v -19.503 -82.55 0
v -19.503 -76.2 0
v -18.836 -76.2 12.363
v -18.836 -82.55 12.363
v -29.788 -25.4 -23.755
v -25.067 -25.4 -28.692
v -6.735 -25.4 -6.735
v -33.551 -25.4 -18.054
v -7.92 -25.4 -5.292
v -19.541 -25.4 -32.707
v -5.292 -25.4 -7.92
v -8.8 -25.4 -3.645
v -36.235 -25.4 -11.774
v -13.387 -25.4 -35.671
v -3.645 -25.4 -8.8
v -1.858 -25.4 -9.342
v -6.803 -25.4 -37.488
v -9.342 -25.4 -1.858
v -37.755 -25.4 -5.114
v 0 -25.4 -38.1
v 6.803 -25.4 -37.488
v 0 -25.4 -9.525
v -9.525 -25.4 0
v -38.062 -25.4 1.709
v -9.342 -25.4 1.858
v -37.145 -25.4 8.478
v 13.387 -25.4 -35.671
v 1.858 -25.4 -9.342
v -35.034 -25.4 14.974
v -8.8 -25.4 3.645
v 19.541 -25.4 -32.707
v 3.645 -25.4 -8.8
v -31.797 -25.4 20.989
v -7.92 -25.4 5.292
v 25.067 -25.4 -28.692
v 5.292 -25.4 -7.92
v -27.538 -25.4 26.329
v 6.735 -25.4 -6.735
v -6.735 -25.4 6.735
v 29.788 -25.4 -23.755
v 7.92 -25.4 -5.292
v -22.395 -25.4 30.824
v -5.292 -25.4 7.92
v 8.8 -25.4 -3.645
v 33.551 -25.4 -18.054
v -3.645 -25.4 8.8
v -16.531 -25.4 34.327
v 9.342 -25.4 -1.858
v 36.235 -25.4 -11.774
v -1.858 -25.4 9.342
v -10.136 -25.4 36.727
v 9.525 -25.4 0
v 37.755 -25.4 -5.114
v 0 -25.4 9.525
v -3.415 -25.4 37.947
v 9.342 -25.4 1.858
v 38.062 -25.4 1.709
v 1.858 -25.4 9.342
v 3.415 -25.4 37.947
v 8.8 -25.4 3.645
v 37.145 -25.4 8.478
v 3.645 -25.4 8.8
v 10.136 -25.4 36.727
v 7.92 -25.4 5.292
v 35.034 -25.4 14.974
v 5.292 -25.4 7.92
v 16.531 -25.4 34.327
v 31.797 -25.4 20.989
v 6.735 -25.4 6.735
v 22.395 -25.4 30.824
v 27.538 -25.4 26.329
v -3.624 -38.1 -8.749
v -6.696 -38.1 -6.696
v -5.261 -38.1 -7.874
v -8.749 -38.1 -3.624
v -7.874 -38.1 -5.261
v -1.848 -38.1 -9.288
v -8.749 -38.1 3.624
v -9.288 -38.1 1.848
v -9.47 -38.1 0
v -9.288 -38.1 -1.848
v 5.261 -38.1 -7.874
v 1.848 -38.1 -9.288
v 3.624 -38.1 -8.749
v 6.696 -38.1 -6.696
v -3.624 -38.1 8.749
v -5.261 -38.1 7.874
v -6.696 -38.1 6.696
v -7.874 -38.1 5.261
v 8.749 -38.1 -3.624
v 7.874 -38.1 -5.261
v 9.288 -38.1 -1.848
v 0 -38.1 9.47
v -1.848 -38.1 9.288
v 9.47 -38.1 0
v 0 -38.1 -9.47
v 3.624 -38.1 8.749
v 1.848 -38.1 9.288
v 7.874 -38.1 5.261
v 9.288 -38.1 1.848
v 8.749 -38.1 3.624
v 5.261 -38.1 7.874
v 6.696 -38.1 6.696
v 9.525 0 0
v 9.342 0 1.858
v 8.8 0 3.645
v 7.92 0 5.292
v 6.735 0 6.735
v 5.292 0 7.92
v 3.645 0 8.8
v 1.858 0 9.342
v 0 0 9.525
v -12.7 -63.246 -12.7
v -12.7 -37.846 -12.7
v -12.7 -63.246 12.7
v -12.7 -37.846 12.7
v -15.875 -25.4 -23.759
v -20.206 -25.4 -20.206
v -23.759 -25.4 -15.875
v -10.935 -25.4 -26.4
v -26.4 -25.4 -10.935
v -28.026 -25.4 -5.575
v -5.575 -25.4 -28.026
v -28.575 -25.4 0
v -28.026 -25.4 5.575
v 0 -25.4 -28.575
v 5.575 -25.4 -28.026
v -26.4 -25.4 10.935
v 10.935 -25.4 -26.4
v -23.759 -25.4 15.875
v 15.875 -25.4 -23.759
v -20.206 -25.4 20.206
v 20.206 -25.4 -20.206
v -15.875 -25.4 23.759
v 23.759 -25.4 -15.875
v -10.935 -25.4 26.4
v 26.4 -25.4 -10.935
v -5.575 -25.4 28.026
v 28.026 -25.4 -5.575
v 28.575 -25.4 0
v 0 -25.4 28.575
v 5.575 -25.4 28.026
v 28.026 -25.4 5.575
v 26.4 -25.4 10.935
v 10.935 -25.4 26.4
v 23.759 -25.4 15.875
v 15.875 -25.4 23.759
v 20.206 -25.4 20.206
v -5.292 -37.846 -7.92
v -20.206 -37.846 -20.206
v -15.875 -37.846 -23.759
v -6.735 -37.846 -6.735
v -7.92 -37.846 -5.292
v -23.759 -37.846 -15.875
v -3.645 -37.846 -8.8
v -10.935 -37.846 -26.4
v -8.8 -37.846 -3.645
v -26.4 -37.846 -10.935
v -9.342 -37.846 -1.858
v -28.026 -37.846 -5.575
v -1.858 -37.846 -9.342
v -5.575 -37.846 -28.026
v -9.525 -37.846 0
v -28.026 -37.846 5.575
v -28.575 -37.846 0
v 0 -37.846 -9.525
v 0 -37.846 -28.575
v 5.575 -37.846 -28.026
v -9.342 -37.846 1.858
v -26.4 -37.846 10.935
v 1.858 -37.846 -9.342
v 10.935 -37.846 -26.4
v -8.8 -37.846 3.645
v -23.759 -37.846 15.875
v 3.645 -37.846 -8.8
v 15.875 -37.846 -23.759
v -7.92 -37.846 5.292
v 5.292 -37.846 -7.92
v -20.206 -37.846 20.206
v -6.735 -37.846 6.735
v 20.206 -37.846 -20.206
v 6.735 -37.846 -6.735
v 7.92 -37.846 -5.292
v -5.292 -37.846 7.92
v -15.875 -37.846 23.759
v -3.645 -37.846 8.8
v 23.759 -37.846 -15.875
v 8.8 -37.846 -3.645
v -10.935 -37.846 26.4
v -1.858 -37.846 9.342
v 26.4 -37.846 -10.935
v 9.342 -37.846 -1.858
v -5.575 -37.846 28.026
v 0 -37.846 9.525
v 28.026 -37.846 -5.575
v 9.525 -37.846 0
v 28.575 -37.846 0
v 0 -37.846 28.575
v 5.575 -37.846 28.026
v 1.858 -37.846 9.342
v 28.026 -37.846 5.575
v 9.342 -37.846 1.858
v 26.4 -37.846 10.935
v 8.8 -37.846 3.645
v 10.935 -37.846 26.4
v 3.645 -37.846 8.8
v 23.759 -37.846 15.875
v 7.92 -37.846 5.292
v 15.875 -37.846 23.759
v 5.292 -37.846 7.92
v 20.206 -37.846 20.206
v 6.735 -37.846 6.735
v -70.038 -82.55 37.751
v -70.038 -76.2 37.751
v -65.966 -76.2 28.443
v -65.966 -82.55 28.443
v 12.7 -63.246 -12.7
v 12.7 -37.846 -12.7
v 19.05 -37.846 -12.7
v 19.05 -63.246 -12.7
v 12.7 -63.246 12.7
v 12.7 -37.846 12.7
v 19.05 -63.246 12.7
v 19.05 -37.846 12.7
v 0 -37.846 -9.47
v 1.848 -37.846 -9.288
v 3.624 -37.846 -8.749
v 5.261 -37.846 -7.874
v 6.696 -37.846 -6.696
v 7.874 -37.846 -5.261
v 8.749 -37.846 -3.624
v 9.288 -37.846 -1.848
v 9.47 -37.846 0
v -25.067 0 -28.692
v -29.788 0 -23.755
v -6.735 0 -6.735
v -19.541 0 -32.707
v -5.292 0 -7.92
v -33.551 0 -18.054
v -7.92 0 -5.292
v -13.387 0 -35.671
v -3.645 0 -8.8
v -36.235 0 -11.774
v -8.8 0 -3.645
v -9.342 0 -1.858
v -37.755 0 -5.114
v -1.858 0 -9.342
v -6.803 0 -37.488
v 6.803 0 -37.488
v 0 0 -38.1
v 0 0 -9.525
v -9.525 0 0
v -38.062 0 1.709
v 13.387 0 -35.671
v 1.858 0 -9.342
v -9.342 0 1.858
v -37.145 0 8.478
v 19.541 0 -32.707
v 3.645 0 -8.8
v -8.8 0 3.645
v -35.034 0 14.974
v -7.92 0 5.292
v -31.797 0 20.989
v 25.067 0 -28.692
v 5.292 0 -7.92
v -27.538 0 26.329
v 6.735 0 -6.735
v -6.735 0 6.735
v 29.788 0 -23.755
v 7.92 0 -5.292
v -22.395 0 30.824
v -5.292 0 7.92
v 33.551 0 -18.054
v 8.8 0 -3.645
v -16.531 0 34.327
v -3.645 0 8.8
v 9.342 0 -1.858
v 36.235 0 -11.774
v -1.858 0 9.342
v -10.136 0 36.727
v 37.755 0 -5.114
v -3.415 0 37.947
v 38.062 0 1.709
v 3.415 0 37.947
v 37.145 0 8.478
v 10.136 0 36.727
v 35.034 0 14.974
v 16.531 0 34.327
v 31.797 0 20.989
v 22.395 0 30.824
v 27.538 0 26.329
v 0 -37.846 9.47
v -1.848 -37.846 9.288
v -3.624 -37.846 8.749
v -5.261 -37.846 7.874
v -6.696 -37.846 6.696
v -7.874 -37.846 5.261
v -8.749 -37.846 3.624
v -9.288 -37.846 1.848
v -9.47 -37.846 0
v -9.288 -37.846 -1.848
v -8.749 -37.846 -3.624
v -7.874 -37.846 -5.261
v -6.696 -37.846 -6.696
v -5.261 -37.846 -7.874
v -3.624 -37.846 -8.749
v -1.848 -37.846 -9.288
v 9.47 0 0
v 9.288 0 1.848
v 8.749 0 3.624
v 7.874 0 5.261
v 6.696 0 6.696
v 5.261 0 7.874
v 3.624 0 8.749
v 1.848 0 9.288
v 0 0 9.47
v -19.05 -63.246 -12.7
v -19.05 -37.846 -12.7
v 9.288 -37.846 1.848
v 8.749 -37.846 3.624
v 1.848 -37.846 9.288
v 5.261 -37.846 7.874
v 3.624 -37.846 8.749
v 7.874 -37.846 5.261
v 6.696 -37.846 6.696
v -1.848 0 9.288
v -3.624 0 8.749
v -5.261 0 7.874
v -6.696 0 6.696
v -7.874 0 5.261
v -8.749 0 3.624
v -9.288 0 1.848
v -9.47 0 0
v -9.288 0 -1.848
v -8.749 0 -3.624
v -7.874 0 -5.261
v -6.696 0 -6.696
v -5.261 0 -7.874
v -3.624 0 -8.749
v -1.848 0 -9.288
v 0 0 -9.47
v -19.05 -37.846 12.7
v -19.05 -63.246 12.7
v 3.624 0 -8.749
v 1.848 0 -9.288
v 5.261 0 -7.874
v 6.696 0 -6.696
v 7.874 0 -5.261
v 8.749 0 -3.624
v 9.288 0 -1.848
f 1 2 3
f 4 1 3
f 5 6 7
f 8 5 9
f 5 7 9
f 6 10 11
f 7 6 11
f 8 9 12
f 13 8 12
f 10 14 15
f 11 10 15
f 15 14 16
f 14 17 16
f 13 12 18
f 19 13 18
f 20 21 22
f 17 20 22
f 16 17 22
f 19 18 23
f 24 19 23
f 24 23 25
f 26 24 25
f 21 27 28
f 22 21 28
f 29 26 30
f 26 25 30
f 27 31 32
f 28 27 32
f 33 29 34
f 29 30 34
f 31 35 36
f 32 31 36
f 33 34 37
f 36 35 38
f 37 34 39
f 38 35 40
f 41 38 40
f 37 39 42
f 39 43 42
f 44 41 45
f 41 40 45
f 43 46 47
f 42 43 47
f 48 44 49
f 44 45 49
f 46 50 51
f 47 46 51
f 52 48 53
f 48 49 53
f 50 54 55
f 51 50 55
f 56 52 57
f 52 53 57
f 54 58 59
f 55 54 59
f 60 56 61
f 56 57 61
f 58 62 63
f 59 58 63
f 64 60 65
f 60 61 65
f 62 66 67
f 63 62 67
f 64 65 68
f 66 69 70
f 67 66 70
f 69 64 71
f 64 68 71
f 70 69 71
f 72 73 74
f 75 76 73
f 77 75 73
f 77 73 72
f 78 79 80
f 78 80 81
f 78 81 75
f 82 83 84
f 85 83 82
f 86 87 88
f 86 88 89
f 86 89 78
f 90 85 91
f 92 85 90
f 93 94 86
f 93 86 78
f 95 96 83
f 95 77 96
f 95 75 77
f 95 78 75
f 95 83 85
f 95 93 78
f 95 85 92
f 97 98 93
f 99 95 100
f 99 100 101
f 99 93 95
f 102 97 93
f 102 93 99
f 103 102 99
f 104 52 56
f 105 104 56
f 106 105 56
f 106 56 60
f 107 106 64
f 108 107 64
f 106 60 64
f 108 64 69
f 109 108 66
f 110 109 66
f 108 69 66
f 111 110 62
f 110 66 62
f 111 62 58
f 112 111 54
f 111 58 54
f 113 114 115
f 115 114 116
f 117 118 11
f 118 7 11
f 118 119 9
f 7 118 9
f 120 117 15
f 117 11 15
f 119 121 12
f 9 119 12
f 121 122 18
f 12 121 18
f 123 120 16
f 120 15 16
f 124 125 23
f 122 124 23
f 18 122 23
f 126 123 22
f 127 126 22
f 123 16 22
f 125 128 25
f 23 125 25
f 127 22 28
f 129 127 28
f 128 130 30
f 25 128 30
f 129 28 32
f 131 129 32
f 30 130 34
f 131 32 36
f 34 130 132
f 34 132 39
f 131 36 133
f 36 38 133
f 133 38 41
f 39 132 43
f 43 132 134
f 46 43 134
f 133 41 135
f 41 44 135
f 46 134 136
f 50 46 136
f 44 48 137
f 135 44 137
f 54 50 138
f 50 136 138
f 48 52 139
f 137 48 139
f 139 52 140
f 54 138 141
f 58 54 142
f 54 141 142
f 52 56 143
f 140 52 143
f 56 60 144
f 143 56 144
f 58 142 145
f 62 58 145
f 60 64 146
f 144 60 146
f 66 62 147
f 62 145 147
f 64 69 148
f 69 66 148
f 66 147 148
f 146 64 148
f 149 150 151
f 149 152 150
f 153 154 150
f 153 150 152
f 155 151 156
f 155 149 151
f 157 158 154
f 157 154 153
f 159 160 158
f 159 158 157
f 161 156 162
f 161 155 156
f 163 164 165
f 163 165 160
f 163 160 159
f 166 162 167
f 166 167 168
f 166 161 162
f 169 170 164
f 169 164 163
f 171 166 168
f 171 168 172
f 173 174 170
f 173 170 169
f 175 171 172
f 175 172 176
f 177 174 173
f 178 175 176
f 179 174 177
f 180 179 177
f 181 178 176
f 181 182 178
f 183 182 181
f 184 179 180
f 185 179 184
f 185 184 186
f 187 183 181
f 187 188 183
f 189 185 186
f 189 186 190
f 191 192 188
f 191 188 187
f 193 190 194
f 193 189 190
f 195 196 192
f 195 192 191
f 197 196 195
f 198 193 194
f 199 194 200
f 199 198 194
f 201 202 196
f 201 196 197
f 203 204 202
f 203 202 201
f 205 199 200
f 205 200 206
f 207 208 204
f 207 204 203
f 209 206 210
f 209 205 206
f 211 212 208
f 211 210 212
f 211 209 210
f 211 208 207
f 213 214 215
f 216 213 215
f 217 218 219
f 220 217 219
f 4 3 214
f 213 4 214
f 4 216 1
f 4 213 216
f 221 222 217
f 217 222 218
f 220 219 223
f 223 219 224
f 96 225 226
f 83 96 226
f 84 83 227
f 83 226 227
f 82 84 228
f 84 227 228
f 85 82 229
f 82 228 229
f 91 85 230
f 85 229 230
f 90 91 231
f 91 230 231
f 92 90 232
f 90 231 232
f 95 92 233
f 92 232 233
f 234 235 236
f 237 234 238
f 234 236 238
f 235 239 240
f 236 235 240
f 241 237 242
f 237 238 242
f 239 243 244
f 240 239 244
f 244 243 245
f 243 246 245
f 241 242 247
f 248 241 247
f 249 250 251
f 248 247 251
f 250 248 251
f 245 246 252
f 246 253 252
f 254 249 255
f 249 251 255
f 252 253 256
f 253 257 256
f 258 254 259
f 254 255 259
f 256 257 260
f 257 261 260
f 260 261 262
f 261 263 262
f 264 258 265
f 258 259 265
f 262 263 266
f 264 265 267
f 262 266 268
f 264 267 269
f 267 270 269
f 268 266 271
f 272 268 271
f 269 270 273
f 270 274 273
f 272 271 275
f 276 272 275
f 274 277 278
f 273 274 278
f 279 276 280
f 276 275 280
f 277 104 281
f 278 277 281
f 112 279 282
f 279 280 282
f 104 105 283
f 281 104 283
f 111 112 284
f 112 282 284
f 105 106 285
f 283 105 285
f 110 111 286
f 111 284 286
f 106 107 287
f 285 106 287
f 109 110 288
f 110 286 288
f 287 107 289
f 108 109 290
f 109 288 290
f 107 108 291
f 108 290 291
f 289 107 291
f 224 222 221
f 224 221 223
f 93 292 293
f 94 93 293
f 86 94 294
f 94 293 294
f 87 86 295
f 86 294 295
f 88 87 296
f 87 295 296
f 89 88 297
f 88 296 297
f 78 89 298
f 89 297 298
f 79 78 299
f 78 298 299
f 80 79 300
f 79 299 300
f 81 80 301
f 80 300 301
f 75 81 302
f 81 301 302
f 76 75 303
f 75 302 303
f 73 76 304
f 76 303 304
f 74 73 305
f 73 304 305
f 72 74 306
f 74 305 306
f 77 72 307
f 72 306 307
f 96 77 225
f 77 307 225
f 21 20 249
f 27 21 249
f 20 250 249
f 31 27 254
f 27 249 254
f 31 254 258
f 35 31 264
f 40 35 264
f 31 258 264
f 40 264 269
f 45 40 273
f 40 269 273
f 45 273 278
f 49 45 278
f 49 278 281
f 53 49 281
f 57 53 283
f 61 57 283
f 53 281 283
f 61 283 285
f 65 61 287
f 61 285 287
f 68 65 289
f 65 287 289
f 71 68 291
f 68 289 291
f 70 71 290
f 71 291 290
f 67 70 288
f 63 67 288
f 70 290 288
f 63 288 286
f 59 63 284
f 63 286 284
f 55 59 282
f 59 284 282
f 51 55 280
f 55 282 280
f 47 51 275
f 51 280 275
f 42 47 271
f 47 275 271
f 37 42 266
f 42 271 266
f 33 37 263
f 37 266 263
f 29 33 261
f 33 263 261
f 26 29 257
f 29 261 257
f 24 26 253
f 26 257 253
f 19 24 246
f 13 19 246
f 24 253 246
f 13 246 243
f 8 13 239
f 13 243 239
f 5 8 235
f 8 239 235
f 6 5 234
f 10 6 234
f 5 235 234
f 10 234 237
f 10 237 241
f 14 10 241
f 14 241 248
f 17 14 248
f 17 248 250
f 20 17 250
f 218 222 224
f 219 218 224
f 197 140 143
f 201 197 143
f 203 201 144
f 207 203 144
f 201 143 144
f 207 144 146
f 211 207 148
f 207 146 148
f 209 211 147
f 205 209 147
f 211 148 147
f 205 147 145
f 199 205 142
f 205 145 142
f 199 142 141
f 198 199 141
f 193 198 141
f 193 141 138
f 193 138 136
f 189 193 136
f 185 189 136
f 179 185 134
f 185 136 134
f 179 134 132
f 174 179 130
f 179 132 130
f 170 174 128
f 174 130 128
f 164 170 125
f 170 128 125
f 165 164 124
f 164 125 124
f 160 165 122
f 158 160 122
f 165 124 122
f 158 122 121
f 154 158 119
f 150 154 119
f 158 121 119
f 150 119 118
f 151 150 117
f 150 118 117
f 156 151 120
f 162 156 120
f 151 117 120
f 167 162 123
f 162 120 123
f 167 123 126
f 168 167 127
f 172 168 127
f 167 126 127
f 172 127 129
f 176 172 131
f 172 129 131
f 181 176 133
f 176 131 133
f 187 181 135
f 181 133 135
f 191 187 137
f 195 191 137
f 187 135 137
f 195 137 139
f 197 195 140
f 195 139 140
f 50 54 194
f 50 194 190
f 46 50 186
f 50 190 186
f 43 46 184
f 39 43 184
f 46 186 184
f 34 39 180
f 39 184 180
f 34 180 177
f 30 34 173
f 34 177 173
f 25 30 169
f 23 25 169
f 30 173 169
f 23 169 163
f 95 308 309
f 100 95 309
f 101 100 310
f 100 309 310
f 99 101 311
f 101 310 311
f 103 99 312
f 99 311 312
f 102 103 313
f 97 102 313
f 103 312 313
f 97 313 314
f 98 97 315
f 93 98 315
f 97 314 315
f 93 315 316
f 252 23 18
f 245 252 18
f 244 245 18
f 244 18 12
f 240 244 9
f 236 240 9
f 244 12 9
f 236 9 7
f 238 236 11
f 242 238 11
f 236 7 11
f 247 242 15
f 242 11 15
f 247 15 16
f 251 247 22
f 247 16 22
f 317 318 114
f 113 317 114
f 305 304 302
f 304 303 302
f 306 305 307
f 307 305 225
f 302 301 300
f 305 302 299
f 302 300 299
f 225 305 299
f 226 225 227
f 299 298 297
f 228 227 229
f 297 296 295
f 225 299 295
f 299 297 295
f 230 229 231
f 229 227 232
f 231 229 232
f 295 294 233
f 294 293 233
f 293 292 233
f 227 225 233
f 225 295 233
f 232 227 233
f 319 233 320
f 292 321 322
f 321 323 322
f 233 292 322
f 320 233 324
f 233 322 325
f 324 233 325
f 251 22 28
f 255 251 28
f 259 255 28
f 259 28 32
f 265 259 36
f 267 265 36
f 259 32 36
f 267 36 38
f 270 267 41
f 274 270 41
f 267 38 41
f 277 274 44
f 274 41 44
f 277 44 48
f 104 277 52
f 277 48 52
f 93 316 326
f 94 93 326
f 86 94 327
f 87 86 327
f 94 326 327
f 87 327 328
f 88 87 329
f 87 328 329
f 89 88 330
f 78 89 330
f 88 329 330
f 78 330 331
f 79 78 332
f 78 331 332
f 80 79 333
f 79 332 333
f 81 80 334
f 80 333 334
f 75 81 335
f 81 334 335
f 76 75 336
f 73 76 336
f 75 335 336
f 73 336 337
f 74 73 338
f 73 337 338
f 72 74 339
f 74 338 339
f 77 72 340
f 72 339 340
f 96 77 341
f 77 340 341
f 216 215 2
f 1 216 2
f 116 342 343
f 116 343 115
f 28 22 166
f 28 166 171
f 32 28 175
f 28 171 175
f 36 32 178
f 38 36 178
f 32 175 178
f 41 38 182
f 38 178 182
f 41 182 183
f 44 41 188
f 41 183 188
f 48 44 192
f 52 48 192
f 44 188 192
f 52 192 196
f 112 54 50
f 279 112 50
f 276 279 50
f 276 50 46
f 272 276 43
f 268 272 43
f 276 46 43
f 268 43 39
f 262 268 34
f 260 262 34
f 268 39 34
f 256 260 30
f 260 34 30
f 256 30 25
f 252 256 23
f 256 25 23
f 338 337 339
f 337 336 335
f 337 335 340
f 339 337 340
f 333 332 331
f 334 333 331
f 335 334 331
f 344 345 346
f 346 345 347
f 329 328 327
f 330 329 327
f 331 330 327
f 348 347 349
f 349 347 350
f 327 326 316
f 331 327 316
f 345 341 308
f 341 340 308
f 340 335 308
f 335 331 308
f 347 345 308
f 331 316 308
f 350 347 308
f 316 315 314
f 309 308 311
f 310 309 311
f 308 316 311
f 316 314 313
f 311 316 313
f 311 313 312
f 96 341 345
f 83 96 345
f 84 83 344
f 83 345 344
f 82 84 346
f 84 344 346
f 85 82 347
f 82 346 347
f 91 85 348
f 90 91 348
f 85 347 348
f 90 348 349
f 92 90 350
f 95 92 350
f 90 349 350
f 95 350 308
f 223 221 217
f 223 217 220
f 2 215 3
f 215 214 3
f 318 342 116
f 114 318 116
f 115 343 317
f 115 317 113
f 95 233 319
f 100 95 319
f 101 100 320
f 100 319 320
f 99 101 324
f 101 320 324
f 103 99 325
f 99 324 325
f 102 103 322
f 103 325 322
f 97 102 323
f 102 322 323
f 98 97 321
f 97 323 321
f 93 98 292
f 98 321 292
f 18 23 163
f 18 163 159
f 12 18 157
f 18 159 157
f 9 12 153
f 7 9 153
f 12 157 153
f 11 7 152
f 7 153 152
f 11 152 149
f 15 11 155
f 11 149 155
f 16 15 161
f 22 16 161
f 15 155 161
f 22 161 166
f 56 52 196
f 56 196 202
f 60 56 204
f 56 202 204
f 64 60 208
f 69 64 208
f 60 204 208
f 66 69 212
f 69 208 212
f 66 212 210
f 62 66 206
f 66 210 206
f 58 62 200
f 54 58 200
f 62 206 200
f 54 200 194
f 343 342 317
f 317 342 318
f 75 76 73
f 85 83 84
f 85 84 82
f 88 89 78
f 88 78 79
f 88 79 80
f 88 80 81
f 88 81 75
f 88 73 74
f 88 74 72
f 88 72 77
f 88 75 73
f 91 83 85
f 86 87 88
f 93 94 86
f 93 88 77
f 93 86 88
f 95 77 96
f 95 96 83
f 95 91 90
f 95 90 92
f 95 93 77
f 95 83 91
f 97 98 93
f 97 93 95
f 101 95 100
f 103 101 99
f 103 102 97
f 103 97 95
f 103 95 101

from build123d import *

# Parameters (mm, degrees)
F4_DEPTH  = 38.1
F3_R      = 28.575
F3_R_2    = 9.4701166516
F5_DEPTH  = 12.446
F7_DEPTH  = 118.13693
F8_DEPTH  = 38.1
F6_W      = 6.35
F6_H      = 12.7
F9_DEPTH  = 25.4
F11_START = 76.2
F11_DEPTH = 6.35


with BuildPart() as f1:
    # F0 (on Right) → F1 (revolve)
    with BuildSketch(Plane.YZ):
        Polygon((0, -17.78), (0, 0), (-25.4, 0), (-25.4, -38.1), (0, -38.1), align=None)
    revolve(axis=Axis((0, 5.2446068449, 0), (0, -1, 0)))

    # F2 (on Front) → F4 (join)
    with BuildSketch(Plane.XZ):
        with BuildLine():
            ThreePointArc((0, 9.4701166516), (-9.4701166516, 0), (0, -9.4701166516))
            Line((0, -9.4701166516), (0, 9.4701166516))
        make_face()
        with BuildLine():
            Line((0, 9.4701166516), (0, -9.4701166516))
            ThreePointArc((0, -9.4701166516), (6.696383703, -6.696383703), (9.4701166516, 0))
            ThreePointArc((9.4701166516, 0), (6.696383703, 6.696383703), (0, 9.4701166516))
        make_face()
    extrude(amount=F4_DEPTH)


with BuildPart() as f5:
    # F3 (on face) → F5 (new body)
    with BuildSketch(Plane.XZ.offset(25.4)):
        Circle(F3_R)
        Circle(F3_R_2, mode=Mode.SUBTRACT)
        Circle(F3_R_2)
    extrude(amount=F5_DEPTH)


with BuildPart() as f7_tool:
    # F6 (on face) → F7 (new body)
    with BuildSketch(Plane.XZ.offset(37.846)):
        with BuildLine():
            Line((0, 0), (9.525, 0))
            ThreePointArc((9.525, 0), (6.7351920908, 6.7351920908), (0, 9.525))
            Line((0, 9.525), (0, 0))
        make_face()
        with BuildLine():
            Line((0, 0), (0, 9.525))
            ThreePointArc((0, 9.525), (-6.7351920908, 6.7351920908), (-9.525, 0))
            Line((-9.525, 0), (0, 0))
        make_face()
        with BuildLine():
            ThreePointArc((-9.525, 0), (-6.7351920908, -6.7351920908), (0, -9.525))
            Line((0, -9.525), (0, 0))
            Line((0, 0), (-9.525, 0))
        make_face()
        with BuildLine():
            ThreePointArc((0, -9.525), (6.7351920908, -6.7351920908), (9.525, 0))
            Line((9.525, 0), (0, 0))
            Line((0, 0), (0, -9.525))
        make_face()
    extrude(amount=-F7_DEPTH)


with BuildPart() as f1_1:
    add(f1.part)

    # F7: cut by f7_tool
    add(f7_tool.part, mode=Mode.SUBTRACT)


with BuildPart() as f5_1:
    add(f5.part)

    # F7: cut by f7_tool
    add(f7_tool.part, mode=Mode.SUBTRACT)


with BuildPart() as f8:
    # F2 (on Front) → F8 (new body)
    with BuildSketch(Plane.XZ):
        with BuildLine():
            Line((0, 9.4701166516), (0, -9.4701166516))
            ThreePointArc((0, -9.4701166516), (6.696383703, -6.696383703), (9.4701166516, 0))
            ThreePointArc((9.4701166516, 0), (6.696383703, 6.696383703), (0, 9.4701166516))
        make_face()
        with BuildLine():
            ThreePointArc((0, 9.4701166516), (-9.4701166516, 0), (0, -9.4701166516))
            Line((0, -9.4701166516), (0, 9.4701166516))
        make_face()
    extrude(amount=F8_DEPTH)


with BuildPart() as f9:
    # F6 (on face) → F9 (new body)
    with BuildSketch(Plane.XZ.offset(37.846)):
        with Locations((-15.875, 6.35)):
            Rectangle(F6_W, F6_H)
        with Locations((-15.875, -6.35)):
            Rectangle(F6_W, F6_H)
    extrude(amount=F9_DEPTH)


with BuildPart() as f9b:
    # F6 (on face) → F9, piece 2 (new body)
    with BuildSketch(Plane.XZ.offset(37.846)):
        with Locations((15.875, 6.35)):
            Rectangle(F6_W, F6_H)
        with Locations((15.875, -6.35)):
            Rectangle(F6_W, F6_H)
    extrude(amount=F9_DEPTH)


with BuildPart() as f11:
    # F10 (on Front) → F11 (new body)
    with BuildSketch(Plane.XZ.offset(F11_START)):
        Polygon((-65.9655656783, 28.4429107026), (-19.502600655, 0), (-18.8364831494, 12.3632987734), (-70.0378857396, 37.7510689156), align=None)
    extrude(amount=F11_DEPTH)


solid = Compound([f1_1.part, f5_1.part, f8.part, f9.part, f9b.part, f11.part])
